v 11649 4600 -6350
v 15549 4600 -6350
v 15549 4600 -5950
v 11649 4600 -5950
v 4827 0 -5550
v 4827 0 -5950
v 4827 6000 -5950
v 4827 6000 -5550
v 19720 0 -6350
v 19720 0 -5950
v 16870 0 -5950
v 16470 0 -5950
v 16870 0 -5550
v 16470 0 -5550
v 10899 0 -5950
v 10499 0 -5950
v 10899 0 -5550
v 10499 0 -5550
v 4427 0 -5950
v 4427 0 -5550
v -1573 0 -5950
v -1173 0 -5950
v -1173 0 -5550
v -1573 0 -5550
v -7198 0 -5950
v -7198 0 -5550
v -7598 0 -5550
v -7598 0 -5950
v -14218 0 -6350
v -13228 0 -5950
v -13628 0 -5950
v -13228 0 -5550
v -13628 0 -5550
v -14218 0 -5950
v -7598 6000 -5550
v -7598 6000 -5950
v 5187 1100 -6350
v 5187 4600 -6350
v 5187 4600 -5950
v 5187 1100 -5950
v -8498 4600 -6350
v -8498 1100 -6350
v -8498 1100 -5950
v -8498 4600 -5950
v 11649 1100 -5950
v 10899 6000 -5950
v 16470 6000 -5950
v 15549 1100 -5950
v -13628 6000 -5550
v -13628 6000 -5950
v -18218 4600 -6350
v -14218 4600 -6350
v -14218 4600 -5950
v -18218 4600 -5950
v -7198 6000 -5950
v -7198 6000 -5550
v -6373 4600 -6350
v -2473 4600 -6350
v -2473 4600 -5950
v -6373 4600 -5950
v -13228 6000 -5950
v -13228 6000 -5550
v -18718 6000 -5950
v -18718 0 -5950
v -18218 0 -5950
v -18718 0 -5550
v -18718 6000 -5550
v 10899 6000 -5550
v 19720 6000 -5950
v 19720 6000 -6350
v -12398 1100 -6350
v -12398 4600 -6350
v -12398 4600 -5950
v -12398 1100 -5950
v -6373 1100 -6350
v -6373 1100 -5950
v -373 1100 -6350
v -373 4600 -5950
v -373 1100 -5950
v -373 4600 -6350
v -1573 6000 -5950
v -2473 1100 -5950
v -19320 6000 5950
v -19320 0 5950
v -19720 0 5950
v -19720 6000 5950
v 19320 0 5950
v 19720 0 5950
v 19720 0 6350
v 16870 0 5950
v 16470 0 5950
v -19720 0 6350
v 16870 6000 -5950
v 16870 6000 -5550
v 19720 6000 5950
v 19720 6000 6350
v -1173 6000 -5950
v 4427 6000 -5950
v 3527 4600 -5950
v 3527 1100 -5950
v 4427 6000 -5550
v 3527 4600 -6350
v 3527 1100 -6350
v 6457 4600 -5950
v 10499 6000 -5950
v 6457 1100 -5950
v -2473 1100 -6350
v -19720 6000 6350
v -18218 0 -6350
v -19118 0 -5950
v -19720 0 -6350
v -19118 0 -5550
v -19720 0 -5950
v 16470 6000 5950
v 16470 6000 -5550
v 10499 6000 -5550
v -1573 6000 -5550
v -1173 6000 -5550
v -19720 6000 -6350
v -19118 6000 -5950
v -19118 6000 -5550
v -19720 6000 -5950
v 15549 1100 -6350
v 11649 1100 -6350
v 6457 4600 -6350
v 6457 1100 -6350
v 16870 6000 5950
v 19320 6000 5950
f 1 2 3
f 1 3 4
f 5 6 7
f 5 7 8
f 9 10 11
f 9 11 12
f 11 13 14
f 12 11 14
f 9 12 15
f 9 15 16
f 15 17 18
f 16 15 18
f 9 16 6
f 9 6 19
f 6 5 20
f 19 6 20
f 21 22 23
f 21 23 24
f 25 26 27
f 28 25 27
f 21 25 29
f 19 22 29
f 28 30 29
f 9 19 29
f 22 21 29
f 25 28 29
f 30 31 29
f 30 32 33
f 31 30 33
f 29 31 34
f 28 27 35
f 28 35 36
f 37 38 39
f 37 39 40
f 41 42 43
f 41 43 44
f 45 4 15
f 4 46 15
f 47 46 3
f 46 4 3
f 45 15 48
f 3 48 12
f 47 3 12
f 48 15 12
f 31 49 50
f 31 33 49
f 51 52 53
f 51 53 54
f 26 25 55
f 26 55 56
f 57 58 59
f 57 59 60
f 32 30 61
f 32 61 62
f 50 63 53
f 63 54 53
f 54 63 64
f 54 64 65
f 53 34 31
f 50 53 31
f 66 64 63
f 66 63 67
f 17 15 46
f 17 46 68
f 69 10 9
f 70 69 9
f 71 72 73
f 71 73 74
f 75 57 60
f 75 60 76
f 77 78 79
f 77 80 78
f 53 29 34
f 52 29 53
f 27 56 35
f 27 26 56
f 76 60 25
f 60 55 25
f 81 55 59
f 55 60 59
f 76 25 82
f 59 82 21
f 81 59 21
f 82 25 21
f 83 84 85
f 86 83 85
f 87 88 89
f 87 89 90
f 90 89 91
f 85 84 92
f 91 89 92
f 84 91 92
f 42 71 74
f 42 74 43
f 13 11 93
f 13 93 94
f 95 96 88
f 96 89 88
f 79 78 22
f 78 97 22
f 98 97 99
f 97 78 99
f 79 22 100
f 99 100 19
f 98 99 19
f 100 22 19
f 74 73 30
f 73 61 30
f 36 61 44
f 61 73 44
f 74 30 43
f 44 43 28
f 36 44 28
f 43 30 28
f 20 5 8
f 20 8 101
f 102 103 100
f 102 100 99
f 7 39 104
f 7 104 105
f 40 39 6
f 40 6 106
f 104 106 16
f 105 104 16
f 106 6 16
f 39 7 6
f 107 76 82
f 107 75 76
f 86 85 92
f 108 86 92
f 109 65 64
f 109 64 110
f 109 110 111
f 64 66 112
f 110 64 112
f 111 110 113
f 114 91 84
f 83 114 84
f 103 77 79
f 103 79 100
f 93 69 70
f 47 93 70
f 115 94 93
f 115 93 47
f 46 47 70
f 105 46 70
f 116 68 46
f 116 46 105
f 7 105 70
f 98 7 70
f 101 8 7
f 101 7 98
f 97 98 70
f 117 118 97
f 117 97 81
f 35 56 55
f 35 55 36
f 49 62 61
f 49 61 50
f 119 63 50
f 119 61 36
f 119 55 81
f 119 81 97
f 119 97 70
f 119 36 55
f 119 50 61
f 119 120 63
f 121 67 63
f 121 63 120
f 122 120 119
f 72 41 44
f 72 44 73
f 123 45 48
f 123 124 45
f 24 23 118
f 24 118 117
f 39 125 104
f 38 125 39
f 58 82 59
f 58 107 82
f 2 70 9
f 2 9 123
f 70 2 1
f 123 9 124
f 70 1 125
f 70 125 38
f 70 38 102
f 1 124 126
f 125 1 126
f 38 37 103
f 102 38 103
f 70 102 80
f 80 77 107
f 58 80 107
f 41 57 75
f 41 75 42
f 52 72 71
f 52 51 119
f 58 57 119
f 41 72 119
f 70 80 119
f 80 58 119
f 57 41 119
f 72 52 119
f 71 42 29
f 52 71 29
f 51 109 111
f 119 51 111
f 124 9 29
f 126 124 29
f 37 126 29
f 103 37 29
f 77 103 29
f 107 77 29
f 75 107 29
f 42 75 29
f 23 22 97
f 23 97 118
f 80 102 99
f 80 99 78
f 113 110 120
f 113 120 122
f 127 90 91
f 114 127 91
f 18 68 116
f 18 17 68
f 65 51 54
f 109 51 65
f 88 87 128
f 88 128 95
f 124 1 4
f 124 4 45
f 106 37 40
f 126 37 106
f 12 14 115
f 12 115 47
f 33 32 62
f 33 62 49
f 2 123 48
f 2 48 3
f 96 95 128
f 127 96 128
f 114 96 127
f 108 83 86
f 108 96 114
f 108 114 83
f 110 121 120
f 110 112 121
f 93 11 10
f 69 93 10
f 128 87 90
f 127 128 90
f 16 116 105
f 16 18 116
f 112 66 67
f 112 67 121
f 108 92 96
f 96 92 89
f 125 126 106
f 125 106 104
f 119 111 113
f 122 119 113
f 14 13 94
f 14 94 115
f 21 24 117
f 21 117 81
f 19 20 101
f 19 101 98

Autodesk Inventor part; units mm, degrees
ref_plane "YZ Plane" through (0, 0, 0) normal (1, 0, 0) x (0, 1, 0)
ref_plane "XZ Plane" through (0, 0, 0) normal (0, 1, 0) x (-1, 0, 0)
ref_plane "XY Plane" through (0, 0, 0) normal (0, 0, 1) x (1, 0, 0)
sketch "Sketch1" plane through (0, 0, 0) normal (0, 1, 0) x (-1, 0, 0)
  line L0 (19320, -5950) -> (-19320, -5950)
  line L1 (-19320, -5950) -> (-19320, 5950)
  line L2 (-19320, 5950) -> (19320, 5950)
  line L3 (19320, 5950) -> (19320, -5950)
  line L4 (19320, -5950) -> (-19320, 5950) construction
  line L5 (-19320, -5950) -> (19320, 5950) construction
  line L6 (-19720, -6350) -> (19720, -6350)
  line L7 (19720, -6350) -> (19720, 6350)
  line L8 (19720, 6350) -> (-19720, 6350)
  line L9 (-19720, 6350) -> (-19720, -6350)
  line L10 (-16470, -5950) -> (-16870, -5950)
  line L11 (-16870, -5950) -> (-16870, -5550)
  line L12 (-16870, -5550) -> (-16470, -5550)
  line L13 (-16470, -5550) -> (-16470, -5950)
  line L14 (-16470, -5950) -> (-16870, -5550) construction
  line L15 (-16870, -5950) -> (-16470, -5550) construction
  line L16 (-16470, 5850) -> (-16870, 5850)
  line L17 (-16870, 5850) -> (-16870, 5950)
  line L18 (-16870, 5950) -> (-16470, 5950)
  line L19 (-16470, 5950) -> (-16470, 5850)
  line L20 (-16470, 5850) -> (-16870, 5950) construction
  line L21 (-16870, 5850) -> (-16470, 5950) construction
  line L22 (-10499, -5950) -> (-10899, -5950)
  line L23 (-10899, -5950) -> (-10899, -5550)
  line L24 (-10899, -5550) -> (-10499, -5550)
  line L25 (-10499, -5550) -> (-10499, -5950)
  line L26 (-10499, -5950) -> (-10899, -5550) construction
  line L27 (-10899, -5950) -> (-10499, -5550) construction
  line L28 (-4427, -5950) -> (-4827, -5950)
  line L29 (-4827, -5950) -> (-4827, -5550)
  line L30 (-4827, -5550) -> (-4427, -5550)
  line L31 (-4427, -5550) -> (-4427, -5950)
  line L32 (-4427, -5950) -> (-4827, -5550) construction
  line L33 (-4827, -5950) -> (-4427, -5550) construction
  line L34 (1573, -5950) -> (1173, -5950)
  line L35 (1173, -5950) -> (1173, -5550)
  line L36 (1173, -5550) -> (1573, -5550)
  line L37 (1573, -5550) -> (1573, -5950)
  line L38 (1573, -5950) -> (1173, -5550) construction
  line L39 (1173, -5950) -> (1573, -5550) construction
  line L40 (7598, -5950) -> (7198, -5950)
  line L41 (7198, -5950) -> (7198, -5550)
  line L42 (7198, -5550) -> (7598, -5550)
  line L43 (7598, -5550) -> (7598, -5950)
  line L44 (7598, -5950) -> (7198, -5550) construction
  line L45 (7198, -5950) -> (7598, -5550) construction
  line L46 (13628, -5950) -> (13228, -5950)
  line L47 (13228, -5950) -> (13228, -5550)
  line L48 (13228, -5550) -> (13628, -5550)
  line L49 (13628, -5550) -> (13628, -5950)
  line L50 (13628, -5950) -> (13228, -5550) construction
  line L51 (13228, -5950) -> (13628, -5550) construction
  line L52 (19118, -5950) -> (18718, -5950)
  line L53 (18718, -5950) -> (18718, -5550)
  line L54 (18718, -5550) -> (19118, -5550)
  line L55 (19118, -5550) -> (19118, -5950)
  line L56 (19118, -5950) -> (18718, -5550) construction
  line L57 (18718, -5950) -> (19118, -5550) construction
  line L58 (19320, -5950) -> (19720, -5950)
  line L59 (-19320, -5950) -> (-19720, -5950)
  line L60 (-19320, 5950) -> (-19720, 5950)
  line L61 (19320, 5950) -> (19720, 5950)
  point P0 (0, 0)
  point P1 (-16670, -5750)
  point P2 (-16670, 5900)
  point P3 (-16870, 5950)
  point P4 (-16470, 5950)
  point P5 (-10699, -5750)
  point P6 (-4627, -5750)
  point P7 (1373, -5750)
  point P8 (7398, -5750)
  point P9 (13428, -5750)
  point P10 (18918, -5750)
  dimension "d0" = 38640
  dimension "d1" = 11900
  dimension "d2" = 400
  dimension "d3" = 400
  dimension "d4" = 400
  dimension "d5" = 2450
  dimension "d6" = 100
  dimension "d35" = 6030
  dimension "d37" = 5490
  dimension "d38" = 6025
  dimension "d39" = 6000
  dimension "d40" = 6072
  dimension "d41" = 5971
  dimension "d42" = 202
extrude "Extrusion1" add sketch "Sketch1" along normal blind 6000 contours L58 L7 L6 L9 L59 L0 | L0 L53 L54 L55 | L0 L47 L48 L49 | L0 L41 L42 L43 | L11 L12 L13 L0 | L0 L35 L36 L37 | L23 L24 L25 L0 | L0 L29 L30 L31
sketch "Sketch2" plane through (19720, 0, -6350) normal (0, 0, -1) x (-1, 0, 0)
  line L0 (0, 0) -> (39440, 0) projected
  line L1 (39440, 0) -> (39440, 6000) projected
  line L2 (0, 6000) -> (39440, 6000) projected
  line L3 (0, 0) -> (0, 6000) projected
  line L4 (33938, 4600) -> (37938, 4600)
  line L5 (37938, 4600) -> (37938, 0)
  line L6 (37938, 0) -> (33938, 0)
  line L7 (33938, 0) -> (33938, 4600)
  line L8 (28218, 4600) -> (32118, 4600)
  line L9 (32118, 4600) -> (32118, 1100)
  line L10 (32118, 1100) -> (28218, 1100)
  line L11 (28218, 1100) -> (28218, 4600)
  line L12 (22193, 4600) -> (26093, 4600)
  line L13 (26093, 4600) -> (26093, 1100)
  line L14 (26093, 1100) -> (22193, 1100)
  line L15 (22193, 1100) -> (22193, 4600)
  line L16 (16193, 4600) -> (20093, 4600)
  line L17 (20093, 4600) -> (20093, 1100)
  line L18 (20093, 1100) -> (16193, 1100)
  line L19 (16193, 1100) -> (16193, 4600)
  line L20 (4171, 4600) -> (8071, 4600)
  line L21 (8071, 4600) -> (8071, 1100)
  line L22 (8071, 1100) -> (4171, 1100)
  line L23 (4171, 1100) -> (4171, 4600)
  line L24 (13263, 4600) -> (14533, 4600)
  line L25 (14533, 4600) -> (14533, 1100)
  line L26 (14533, 1100) -> (13263, 1100)
  line L27 (13263, 1100) -> (13263, 4600)
  line L28 (3250, 0) -> (3250, 6000) projected
  line L29 (8821, 0) -> (8821, 6000) projected
  line L30 (15293, 0) -> (15293, 6000) projected
  line L31 (21293, 0) -> (21293, 6000) projected
  line L32 (27318, 0) -> (27318, 6000) projected
  line L33 (38438, 0) -> (38438, 6000) projected
  line L34 (9221, 0) -> (9221, 6000) projected
  point P0 (19720, 0)
  dimension "d16" = 3900
  dimension "d17" = 1100
  dimension "d18" = 921
  dimension "d19" = 3500
  dimension "d43" = 750
  dimension "d44" = 900
  dimension "d45" = 900
  dimension "d46" = 900
  dimension "d47" = 4600
  dimension "d48" = 4000
  dimension "d49" = 500
  dimension "d50" = 1270
  dimension "d54" = 760
extrude "Extrusion2" cut sketch "Sketch2" against normal up to surface (400 mm away) contours L7 L4 L5 L0 | L8 L9 L10 L11 | L12 L13 L14 L15 | L16 L17 L18 L19 | L20 L21 L22 L23 | L24 L25 L26 L27
extrude "Extrusion3" add sketch "Sketch1" along normal blind 6000 separate body contours L2 L60 L9 L8 L7 L61
